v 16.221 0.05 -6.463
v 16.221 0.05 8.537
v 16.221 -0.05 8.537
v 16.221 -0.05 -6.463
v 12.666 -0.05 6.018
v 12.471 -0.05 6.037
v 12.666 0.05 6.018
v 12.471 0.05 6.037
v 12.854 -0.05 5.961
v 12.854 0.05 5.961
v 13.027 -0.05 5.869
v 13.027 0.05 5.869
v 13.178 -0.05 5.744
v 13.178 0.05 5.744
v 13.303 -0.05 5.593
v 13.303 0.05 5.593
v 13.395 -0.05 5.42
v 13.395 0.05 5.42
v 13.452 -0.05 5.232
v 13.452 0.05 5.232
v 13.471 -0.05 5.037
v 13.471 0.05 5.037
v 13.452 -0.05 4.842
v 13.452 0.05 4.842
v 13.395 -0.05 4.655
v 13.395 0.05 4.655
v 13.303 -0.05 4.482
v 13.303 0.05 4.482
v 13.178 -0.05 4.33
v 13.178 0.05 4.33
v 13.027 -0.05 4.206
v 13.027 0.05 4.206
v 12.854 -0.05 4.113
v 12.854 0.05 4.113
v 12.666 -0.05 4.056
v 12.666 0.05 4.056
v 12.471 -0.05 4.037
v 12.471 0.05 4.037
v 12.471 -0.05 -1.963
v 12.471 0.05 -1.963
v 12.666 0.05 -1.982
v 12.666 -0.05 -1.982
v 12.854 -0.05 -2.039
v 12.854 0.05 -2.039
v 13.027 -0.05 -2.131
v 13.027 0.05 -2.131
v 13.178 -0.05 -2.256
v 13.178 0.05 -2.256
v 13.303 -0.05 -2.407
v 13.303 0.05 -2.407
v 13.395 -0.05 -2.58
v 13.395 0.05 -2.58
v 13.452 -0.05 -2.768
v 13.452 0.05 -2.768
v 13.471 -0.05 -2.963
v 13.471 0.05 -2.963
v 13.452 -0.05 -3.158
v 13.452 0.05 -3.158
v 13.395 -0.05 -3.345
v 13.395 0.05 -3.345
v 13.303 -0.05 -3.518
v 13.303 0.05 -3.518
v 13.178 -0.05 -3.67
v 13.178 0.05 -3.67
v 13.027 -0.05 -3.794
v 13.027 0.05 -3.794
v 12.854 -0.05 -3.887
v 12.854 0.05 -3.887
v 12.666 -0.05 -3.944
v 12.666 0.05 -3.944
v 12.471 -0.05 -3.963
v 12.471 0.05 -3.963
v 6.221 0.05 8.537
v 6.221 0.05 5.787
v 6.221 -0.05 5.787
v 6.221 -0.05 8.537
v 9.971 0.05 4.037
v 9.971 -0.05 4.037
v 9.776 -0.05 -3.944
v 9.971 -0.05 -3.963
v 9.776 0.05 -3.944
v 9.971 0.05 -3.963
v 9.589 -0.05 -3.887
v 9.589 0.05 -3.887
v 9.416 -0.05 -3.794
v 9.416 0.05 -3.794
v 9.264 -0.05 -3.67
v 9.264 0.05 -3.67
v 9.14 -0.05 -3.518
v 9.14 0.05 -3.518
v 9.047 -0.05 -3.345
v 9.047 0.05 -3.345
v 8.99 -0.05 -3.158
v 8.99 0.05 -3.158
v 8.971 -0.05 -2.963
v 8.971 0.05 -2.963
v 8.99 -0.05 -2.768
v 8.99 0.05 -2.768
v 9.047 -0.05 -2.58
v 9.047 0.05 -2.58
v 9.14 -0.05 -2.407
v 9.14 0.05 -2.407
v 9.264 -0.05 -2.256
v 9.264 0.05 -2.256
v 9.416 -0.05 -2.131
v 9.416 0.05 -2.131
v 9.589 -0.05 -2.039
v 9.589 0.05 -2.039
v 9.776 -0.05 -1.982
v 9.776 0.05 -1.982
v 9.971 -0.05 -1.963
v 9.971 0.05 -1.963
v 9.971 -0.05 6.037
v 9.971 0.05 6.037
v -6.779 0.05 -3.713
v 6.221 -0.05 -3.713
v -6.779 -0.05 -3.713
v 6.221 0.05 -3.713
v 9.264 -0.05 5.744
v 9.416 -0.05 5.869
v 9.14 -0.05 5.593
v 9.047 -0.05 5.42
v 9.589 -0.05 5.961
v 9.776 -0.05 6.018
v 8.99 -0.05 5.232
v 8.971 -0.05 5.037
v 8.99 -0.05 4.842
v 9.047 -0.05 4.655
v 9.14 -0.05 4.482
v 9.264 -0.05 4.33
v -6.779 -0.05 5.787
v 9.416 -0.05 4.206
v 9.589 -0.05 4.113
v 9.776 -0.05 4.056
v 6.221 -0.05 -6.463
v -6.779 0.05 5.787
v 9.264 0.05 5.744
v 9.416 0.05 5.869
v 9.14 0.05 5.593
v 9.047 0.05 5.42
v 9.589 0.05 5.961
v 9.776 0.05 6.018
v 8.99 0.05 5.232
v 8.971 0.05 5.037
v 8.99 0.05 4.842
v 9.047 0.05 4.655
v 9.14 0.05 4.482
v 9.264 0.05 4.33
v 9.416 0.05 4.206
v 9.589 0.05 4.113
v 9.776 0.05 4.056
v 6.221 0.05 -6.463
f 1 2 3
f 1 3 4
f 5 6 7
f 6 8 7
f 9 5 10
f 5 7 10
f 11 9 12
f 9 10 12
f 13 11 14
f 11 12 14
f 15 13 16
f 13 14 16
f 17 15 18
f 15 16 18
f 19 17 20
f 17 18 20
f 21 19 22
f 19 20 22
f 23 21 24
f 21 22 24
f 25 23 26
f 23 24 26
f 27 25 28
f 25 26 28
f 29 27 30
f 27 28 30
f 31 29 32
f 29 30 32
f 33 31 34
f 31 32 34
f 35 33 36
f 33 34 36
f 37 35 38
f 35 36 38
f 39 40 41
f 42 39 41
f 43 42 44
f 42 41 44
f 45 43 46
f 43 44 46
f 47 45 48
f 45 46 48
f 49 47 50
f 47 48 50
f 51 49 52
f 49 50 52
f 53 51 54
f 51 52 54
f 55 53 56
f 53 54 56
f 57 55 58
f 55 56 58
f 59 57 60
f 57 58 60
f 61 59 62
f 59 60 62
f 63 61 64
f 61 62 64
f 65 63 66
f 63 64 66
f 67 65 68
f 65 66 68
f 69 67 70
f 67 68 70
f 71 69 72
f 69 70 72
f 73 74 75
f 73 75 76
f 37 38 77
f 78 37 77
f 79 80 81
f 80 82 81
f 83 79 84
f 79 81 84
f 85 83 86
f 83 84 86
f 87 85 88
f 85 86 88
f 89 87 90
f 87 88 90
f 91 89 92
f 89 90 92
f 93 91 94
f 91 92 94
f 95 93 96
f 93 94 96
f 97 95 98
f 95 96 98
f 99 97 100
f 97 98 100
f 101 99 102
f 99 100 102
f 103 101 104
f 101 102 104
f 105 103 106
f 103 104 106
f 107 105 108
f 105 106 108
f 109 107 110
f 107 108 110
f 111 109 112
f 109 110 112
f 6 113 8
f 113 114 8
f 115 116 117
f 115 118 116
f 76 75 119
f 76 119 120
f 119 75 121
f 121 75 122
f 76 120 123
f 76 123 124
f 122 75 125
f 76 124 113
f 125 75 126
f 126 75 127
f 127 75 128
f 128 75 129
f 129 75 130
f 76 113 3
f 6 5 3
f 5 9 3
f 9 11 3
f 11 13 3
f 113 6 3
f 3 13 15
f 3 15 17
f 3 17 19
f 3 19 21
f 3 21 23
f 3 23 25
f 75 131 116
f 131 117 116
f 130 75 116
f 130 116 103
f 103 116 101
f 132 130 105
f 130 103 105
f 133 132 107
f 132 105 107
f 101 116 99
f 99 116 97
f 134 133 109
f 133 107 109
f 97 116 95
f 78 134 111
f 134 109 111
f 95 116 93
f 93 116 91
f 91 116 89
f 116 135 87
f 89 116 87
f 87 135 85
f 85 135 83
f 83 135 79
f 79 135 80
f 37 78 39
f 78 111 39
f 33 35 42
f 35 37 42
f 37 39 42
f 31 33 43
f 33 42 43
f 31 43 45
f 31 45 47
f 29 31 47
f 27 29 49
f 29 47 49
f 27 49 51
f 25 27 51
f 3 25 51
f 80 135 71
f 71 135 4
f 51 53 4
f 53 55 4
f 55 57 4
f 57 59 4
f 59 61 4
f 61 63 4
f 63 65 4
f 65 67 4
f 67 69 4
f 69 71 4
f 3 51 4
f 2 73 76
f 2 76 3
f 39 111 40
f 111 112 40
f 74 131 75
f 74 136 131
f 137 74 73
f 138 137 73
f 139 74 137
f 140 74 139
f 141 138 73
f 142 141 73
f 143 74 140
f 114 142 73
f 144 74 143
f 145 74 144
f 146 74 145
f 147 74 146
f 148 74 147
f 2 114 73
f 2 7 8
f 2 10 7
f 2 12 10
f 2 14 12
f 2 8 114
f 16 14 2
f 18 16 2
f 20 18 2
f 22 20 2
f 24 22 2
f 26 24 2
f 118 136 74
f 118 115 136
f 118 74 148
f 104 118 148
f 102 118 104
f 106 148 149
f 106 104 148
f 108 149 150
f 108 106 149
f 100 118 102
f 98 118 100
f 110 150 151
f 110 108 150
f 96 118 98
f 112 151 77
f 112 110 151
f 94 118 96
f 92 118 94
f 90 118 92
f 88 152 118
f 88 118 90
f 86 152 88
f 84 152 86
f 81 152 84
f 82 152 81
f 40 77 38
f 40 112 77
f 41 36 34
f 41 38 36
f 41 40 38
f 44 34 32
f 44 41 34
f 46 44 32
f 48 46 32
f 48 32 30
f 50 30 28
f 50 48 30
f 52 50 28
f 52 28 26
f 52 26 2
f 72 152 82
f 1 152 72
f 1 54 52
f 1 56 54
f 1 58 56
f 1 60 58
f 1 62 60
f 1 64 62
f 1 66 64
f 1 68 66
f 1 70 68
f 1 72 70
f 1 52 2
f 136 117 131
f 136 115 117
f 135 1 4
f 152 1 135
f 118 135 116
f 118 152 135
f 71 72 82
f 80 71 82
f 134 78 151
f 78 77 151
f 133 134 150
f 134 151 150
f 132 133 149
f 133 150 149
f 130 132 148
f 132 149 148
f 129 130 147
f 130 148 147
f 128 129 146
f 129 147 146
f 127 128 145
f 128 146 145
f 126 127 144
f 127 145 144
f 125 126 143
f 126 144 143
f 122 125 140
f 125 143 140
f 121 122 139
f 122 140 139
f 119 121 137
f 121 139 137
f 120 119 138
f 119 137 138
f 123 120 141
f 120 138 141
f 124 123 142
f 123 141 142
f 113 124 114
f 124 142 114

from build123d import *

# Parameters (mm, degrees)
BOSS_EXTRUDE1_DEPTH = 0.05


with BuildPart() as part:
    # Sketch1 → Boss-Extrude1 (new, symmetric)
    with BuildSketch(Plane(origin=(0, 0, 0), x_dir=(1, 0, 0), z_dir=(0, 1, 0))):
        Polygon((-6.778814753, -5.787261175), (6.221185247, -5.787261175), (6.221185247, -8.537261175), (16.221185247, -8.537261175), (16.221185247, 6.462738825), (6.221185247, 6.462738825), (6.221185247, 3.712738825), (-6.778814753, 3.712738825), align=None)
        with BuildLine():
            Line((12.471185247, 3.962738825), (9.971185247, 3.962738825))
            ThreePointArc((9.971185247, 3.962738825), (8.971185247, 2.962738825), (9.971185247, 1.962738825))
            Line((9.971185247, 1.962738825), (12.471185247, 1.962738825))
            ThreePointArc((12.471185247, 1.962738825), (13.471185247, 2.962738825), (12.471185247, 3.962738825))
        make_face(mode=Mode.SUBTRACT)
        with BuildLine():
            Line((12.471185247, -4.037261175), (9.971185247, -4.037261175))
            ThreePointArc((9.971185247, -4.037261175), (8.971185247, -5.037261175), (9.971185247, -6.037261175))
            Line((9.971185247, -6.037261175), (12.471185247, -6.037261175))
            ThreePointArc((12.471185247, -6.037261175), (13.471185247, -5.037261175), (12.471185247, -4.037261175))
        make_face(mode=Mode.SUBTRACT)
    extrude(amount=BOSS_EXTRUDE1_DEPTH, both=True)


solid = part.part
